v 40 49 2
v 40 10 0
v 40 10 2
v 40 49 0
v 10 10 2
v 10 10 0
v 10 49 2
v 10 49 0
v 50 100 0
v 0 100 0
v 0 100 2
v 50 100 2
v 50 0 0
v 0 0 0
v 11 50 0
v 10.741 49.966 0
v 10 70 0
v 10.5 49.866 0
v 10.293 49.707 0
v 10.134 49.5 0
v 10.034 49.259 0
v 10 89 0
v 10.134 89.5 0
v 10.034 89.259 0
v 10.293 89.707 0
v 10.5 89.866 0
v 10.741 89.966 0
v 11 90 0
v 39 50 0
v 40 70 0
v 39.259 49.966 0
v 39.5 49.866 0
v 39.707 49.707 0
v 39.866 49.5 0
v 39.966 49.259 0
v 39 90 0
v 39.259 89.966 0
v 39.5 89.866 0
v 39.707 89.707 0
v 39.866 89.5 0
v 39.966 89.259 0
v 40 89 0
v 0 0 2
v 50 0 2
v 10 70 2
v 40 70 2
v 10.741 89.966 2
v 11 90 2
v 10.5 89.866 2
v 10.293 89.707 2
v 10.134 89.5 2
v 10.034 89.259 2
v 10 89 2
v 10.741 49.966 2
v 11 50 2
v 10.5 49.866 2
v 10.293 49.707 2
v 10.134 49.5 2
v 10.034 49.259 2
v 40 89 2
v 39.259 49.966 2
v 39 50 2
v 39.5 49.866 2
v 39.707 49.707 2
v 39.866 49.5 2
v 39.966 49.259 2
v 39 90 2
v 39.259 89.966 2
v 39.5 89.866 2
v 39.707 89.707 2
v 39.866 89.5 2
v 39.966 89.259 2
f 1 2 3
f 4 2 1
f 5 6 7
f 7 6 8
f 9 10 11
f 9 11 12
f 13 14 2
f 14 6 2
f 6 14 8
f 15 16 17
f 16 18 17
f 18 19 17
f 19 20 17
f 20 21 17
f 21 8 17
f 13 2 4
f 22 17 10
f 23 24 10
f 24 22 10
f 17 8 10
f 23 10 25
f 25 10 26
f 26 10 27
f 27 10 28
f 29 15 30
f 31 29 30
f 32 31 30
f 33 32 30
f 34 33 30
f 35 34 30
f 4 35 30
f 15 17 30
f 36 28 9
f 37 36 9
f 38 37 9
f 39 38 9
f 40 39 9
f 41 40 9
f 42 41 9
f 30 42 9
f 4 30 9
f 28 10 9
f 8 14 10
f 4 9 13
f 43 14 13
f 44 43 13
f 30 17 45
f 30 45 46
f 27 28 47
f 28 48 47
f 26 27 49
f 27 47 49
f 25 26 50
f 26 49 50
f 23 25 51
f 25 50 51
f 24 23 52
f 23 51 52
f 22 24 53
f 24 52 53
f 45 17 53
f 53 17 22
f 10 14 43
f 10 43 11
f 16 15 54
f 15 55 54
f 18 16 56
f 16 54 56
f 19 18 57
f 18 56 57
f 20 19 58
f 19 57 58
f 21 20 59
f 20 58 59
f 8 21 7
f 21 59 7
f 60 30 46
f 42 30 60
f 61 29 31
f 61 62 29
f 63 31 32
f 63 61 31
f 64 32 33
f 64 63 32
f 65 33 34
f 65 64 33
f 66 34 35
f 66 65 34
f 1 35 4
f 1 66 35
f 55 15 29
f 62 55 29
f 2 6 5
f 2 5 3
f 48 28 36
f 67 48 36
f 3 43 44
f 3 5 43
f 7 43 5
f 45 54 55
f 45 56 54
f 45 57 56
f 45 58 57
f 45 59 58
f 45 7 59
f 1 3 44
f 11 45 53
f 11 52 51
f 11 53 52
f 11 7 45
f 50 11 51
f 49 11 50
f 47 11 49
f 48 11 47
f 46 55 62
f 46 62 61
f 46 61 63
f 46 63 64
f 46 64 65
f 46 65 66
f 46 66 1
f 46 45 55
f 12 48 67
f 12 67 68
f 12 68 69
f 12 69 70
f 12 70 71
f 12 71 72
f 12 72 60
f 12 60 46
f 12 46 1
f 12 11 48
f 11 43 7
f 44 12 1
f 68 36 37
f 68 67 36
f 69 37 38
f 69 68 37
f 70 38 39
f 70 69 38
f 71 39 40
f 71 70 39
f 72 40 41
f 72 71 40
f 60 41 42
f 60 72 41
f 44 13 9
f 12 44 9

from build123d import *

# Parameters (mm, degrees)
BOX001_W     = 30
BOX001_H     = 40
BOX001_DEPTH = 10
BOX002_W     = 30
BOX002_H     = 20
BOX002_DEPTH = 10
BOX_W        = 50
BOX_H        = 100
BOX_DEPTH    = 2
FILLET001_R  = 1
FILLET002_R  = 1


with BuildPart() as cubo001:
    # Box001 → Box001 (new body)
    with BuildSketch(Plane(origin=(10, 10, 0), x_dir=(1, 0, 0), z_dir=(0, 0, 1))):
        with Locations((15, 20)):
            Rectangle(BOX001_W, BOX001_H)
    extrude(amount=BOX001_DEPTH)


with BuildPart() as fusion:
    # Box002 → Box002 (new body)
    with BuildSketch(Plane(origin=(10, 70, 0), x_dir=(1, 0, 0), z_dir=(0, 0, 1))):
        with Locations((15, 10)):
            Rectangle(BOX002_W, BOX002_H)
    extrude(amount=BOX002_DEPTH)

    # Fusion: union Cubo001
    add(cubo001.part)


with BuildPart() as fillet002:
    # Box → Box (new body)
    with BuildSketch(Plane.XY):
        with Locations((25, 50)):
            Rectangle(BOX_W, BOX_H)
    extrude(amount=BOX_DEPTH)

    # Cut: cut Fusion
    add(fusion.part, mode=Mode.SUBTRACT)

    # Fillet001
    fillet001_edges = [fillet002.edges().sort_by_distance(p)[0] for p in [
        (10, 50, 1),
        (10, 90, 1),
    ]]
    fillet(fillet001_edges, radius=FILLET001_R)

    # Fillet002
    fillet002_edges = [fillet002.edges().sort_by_distance(p)[0] for p in [
        (40, 50, 1),
        (40, 90, 1),
    ]]
    fillet(fillet002_edges, radius=FILLET002_R)


solid = fillet002.part
